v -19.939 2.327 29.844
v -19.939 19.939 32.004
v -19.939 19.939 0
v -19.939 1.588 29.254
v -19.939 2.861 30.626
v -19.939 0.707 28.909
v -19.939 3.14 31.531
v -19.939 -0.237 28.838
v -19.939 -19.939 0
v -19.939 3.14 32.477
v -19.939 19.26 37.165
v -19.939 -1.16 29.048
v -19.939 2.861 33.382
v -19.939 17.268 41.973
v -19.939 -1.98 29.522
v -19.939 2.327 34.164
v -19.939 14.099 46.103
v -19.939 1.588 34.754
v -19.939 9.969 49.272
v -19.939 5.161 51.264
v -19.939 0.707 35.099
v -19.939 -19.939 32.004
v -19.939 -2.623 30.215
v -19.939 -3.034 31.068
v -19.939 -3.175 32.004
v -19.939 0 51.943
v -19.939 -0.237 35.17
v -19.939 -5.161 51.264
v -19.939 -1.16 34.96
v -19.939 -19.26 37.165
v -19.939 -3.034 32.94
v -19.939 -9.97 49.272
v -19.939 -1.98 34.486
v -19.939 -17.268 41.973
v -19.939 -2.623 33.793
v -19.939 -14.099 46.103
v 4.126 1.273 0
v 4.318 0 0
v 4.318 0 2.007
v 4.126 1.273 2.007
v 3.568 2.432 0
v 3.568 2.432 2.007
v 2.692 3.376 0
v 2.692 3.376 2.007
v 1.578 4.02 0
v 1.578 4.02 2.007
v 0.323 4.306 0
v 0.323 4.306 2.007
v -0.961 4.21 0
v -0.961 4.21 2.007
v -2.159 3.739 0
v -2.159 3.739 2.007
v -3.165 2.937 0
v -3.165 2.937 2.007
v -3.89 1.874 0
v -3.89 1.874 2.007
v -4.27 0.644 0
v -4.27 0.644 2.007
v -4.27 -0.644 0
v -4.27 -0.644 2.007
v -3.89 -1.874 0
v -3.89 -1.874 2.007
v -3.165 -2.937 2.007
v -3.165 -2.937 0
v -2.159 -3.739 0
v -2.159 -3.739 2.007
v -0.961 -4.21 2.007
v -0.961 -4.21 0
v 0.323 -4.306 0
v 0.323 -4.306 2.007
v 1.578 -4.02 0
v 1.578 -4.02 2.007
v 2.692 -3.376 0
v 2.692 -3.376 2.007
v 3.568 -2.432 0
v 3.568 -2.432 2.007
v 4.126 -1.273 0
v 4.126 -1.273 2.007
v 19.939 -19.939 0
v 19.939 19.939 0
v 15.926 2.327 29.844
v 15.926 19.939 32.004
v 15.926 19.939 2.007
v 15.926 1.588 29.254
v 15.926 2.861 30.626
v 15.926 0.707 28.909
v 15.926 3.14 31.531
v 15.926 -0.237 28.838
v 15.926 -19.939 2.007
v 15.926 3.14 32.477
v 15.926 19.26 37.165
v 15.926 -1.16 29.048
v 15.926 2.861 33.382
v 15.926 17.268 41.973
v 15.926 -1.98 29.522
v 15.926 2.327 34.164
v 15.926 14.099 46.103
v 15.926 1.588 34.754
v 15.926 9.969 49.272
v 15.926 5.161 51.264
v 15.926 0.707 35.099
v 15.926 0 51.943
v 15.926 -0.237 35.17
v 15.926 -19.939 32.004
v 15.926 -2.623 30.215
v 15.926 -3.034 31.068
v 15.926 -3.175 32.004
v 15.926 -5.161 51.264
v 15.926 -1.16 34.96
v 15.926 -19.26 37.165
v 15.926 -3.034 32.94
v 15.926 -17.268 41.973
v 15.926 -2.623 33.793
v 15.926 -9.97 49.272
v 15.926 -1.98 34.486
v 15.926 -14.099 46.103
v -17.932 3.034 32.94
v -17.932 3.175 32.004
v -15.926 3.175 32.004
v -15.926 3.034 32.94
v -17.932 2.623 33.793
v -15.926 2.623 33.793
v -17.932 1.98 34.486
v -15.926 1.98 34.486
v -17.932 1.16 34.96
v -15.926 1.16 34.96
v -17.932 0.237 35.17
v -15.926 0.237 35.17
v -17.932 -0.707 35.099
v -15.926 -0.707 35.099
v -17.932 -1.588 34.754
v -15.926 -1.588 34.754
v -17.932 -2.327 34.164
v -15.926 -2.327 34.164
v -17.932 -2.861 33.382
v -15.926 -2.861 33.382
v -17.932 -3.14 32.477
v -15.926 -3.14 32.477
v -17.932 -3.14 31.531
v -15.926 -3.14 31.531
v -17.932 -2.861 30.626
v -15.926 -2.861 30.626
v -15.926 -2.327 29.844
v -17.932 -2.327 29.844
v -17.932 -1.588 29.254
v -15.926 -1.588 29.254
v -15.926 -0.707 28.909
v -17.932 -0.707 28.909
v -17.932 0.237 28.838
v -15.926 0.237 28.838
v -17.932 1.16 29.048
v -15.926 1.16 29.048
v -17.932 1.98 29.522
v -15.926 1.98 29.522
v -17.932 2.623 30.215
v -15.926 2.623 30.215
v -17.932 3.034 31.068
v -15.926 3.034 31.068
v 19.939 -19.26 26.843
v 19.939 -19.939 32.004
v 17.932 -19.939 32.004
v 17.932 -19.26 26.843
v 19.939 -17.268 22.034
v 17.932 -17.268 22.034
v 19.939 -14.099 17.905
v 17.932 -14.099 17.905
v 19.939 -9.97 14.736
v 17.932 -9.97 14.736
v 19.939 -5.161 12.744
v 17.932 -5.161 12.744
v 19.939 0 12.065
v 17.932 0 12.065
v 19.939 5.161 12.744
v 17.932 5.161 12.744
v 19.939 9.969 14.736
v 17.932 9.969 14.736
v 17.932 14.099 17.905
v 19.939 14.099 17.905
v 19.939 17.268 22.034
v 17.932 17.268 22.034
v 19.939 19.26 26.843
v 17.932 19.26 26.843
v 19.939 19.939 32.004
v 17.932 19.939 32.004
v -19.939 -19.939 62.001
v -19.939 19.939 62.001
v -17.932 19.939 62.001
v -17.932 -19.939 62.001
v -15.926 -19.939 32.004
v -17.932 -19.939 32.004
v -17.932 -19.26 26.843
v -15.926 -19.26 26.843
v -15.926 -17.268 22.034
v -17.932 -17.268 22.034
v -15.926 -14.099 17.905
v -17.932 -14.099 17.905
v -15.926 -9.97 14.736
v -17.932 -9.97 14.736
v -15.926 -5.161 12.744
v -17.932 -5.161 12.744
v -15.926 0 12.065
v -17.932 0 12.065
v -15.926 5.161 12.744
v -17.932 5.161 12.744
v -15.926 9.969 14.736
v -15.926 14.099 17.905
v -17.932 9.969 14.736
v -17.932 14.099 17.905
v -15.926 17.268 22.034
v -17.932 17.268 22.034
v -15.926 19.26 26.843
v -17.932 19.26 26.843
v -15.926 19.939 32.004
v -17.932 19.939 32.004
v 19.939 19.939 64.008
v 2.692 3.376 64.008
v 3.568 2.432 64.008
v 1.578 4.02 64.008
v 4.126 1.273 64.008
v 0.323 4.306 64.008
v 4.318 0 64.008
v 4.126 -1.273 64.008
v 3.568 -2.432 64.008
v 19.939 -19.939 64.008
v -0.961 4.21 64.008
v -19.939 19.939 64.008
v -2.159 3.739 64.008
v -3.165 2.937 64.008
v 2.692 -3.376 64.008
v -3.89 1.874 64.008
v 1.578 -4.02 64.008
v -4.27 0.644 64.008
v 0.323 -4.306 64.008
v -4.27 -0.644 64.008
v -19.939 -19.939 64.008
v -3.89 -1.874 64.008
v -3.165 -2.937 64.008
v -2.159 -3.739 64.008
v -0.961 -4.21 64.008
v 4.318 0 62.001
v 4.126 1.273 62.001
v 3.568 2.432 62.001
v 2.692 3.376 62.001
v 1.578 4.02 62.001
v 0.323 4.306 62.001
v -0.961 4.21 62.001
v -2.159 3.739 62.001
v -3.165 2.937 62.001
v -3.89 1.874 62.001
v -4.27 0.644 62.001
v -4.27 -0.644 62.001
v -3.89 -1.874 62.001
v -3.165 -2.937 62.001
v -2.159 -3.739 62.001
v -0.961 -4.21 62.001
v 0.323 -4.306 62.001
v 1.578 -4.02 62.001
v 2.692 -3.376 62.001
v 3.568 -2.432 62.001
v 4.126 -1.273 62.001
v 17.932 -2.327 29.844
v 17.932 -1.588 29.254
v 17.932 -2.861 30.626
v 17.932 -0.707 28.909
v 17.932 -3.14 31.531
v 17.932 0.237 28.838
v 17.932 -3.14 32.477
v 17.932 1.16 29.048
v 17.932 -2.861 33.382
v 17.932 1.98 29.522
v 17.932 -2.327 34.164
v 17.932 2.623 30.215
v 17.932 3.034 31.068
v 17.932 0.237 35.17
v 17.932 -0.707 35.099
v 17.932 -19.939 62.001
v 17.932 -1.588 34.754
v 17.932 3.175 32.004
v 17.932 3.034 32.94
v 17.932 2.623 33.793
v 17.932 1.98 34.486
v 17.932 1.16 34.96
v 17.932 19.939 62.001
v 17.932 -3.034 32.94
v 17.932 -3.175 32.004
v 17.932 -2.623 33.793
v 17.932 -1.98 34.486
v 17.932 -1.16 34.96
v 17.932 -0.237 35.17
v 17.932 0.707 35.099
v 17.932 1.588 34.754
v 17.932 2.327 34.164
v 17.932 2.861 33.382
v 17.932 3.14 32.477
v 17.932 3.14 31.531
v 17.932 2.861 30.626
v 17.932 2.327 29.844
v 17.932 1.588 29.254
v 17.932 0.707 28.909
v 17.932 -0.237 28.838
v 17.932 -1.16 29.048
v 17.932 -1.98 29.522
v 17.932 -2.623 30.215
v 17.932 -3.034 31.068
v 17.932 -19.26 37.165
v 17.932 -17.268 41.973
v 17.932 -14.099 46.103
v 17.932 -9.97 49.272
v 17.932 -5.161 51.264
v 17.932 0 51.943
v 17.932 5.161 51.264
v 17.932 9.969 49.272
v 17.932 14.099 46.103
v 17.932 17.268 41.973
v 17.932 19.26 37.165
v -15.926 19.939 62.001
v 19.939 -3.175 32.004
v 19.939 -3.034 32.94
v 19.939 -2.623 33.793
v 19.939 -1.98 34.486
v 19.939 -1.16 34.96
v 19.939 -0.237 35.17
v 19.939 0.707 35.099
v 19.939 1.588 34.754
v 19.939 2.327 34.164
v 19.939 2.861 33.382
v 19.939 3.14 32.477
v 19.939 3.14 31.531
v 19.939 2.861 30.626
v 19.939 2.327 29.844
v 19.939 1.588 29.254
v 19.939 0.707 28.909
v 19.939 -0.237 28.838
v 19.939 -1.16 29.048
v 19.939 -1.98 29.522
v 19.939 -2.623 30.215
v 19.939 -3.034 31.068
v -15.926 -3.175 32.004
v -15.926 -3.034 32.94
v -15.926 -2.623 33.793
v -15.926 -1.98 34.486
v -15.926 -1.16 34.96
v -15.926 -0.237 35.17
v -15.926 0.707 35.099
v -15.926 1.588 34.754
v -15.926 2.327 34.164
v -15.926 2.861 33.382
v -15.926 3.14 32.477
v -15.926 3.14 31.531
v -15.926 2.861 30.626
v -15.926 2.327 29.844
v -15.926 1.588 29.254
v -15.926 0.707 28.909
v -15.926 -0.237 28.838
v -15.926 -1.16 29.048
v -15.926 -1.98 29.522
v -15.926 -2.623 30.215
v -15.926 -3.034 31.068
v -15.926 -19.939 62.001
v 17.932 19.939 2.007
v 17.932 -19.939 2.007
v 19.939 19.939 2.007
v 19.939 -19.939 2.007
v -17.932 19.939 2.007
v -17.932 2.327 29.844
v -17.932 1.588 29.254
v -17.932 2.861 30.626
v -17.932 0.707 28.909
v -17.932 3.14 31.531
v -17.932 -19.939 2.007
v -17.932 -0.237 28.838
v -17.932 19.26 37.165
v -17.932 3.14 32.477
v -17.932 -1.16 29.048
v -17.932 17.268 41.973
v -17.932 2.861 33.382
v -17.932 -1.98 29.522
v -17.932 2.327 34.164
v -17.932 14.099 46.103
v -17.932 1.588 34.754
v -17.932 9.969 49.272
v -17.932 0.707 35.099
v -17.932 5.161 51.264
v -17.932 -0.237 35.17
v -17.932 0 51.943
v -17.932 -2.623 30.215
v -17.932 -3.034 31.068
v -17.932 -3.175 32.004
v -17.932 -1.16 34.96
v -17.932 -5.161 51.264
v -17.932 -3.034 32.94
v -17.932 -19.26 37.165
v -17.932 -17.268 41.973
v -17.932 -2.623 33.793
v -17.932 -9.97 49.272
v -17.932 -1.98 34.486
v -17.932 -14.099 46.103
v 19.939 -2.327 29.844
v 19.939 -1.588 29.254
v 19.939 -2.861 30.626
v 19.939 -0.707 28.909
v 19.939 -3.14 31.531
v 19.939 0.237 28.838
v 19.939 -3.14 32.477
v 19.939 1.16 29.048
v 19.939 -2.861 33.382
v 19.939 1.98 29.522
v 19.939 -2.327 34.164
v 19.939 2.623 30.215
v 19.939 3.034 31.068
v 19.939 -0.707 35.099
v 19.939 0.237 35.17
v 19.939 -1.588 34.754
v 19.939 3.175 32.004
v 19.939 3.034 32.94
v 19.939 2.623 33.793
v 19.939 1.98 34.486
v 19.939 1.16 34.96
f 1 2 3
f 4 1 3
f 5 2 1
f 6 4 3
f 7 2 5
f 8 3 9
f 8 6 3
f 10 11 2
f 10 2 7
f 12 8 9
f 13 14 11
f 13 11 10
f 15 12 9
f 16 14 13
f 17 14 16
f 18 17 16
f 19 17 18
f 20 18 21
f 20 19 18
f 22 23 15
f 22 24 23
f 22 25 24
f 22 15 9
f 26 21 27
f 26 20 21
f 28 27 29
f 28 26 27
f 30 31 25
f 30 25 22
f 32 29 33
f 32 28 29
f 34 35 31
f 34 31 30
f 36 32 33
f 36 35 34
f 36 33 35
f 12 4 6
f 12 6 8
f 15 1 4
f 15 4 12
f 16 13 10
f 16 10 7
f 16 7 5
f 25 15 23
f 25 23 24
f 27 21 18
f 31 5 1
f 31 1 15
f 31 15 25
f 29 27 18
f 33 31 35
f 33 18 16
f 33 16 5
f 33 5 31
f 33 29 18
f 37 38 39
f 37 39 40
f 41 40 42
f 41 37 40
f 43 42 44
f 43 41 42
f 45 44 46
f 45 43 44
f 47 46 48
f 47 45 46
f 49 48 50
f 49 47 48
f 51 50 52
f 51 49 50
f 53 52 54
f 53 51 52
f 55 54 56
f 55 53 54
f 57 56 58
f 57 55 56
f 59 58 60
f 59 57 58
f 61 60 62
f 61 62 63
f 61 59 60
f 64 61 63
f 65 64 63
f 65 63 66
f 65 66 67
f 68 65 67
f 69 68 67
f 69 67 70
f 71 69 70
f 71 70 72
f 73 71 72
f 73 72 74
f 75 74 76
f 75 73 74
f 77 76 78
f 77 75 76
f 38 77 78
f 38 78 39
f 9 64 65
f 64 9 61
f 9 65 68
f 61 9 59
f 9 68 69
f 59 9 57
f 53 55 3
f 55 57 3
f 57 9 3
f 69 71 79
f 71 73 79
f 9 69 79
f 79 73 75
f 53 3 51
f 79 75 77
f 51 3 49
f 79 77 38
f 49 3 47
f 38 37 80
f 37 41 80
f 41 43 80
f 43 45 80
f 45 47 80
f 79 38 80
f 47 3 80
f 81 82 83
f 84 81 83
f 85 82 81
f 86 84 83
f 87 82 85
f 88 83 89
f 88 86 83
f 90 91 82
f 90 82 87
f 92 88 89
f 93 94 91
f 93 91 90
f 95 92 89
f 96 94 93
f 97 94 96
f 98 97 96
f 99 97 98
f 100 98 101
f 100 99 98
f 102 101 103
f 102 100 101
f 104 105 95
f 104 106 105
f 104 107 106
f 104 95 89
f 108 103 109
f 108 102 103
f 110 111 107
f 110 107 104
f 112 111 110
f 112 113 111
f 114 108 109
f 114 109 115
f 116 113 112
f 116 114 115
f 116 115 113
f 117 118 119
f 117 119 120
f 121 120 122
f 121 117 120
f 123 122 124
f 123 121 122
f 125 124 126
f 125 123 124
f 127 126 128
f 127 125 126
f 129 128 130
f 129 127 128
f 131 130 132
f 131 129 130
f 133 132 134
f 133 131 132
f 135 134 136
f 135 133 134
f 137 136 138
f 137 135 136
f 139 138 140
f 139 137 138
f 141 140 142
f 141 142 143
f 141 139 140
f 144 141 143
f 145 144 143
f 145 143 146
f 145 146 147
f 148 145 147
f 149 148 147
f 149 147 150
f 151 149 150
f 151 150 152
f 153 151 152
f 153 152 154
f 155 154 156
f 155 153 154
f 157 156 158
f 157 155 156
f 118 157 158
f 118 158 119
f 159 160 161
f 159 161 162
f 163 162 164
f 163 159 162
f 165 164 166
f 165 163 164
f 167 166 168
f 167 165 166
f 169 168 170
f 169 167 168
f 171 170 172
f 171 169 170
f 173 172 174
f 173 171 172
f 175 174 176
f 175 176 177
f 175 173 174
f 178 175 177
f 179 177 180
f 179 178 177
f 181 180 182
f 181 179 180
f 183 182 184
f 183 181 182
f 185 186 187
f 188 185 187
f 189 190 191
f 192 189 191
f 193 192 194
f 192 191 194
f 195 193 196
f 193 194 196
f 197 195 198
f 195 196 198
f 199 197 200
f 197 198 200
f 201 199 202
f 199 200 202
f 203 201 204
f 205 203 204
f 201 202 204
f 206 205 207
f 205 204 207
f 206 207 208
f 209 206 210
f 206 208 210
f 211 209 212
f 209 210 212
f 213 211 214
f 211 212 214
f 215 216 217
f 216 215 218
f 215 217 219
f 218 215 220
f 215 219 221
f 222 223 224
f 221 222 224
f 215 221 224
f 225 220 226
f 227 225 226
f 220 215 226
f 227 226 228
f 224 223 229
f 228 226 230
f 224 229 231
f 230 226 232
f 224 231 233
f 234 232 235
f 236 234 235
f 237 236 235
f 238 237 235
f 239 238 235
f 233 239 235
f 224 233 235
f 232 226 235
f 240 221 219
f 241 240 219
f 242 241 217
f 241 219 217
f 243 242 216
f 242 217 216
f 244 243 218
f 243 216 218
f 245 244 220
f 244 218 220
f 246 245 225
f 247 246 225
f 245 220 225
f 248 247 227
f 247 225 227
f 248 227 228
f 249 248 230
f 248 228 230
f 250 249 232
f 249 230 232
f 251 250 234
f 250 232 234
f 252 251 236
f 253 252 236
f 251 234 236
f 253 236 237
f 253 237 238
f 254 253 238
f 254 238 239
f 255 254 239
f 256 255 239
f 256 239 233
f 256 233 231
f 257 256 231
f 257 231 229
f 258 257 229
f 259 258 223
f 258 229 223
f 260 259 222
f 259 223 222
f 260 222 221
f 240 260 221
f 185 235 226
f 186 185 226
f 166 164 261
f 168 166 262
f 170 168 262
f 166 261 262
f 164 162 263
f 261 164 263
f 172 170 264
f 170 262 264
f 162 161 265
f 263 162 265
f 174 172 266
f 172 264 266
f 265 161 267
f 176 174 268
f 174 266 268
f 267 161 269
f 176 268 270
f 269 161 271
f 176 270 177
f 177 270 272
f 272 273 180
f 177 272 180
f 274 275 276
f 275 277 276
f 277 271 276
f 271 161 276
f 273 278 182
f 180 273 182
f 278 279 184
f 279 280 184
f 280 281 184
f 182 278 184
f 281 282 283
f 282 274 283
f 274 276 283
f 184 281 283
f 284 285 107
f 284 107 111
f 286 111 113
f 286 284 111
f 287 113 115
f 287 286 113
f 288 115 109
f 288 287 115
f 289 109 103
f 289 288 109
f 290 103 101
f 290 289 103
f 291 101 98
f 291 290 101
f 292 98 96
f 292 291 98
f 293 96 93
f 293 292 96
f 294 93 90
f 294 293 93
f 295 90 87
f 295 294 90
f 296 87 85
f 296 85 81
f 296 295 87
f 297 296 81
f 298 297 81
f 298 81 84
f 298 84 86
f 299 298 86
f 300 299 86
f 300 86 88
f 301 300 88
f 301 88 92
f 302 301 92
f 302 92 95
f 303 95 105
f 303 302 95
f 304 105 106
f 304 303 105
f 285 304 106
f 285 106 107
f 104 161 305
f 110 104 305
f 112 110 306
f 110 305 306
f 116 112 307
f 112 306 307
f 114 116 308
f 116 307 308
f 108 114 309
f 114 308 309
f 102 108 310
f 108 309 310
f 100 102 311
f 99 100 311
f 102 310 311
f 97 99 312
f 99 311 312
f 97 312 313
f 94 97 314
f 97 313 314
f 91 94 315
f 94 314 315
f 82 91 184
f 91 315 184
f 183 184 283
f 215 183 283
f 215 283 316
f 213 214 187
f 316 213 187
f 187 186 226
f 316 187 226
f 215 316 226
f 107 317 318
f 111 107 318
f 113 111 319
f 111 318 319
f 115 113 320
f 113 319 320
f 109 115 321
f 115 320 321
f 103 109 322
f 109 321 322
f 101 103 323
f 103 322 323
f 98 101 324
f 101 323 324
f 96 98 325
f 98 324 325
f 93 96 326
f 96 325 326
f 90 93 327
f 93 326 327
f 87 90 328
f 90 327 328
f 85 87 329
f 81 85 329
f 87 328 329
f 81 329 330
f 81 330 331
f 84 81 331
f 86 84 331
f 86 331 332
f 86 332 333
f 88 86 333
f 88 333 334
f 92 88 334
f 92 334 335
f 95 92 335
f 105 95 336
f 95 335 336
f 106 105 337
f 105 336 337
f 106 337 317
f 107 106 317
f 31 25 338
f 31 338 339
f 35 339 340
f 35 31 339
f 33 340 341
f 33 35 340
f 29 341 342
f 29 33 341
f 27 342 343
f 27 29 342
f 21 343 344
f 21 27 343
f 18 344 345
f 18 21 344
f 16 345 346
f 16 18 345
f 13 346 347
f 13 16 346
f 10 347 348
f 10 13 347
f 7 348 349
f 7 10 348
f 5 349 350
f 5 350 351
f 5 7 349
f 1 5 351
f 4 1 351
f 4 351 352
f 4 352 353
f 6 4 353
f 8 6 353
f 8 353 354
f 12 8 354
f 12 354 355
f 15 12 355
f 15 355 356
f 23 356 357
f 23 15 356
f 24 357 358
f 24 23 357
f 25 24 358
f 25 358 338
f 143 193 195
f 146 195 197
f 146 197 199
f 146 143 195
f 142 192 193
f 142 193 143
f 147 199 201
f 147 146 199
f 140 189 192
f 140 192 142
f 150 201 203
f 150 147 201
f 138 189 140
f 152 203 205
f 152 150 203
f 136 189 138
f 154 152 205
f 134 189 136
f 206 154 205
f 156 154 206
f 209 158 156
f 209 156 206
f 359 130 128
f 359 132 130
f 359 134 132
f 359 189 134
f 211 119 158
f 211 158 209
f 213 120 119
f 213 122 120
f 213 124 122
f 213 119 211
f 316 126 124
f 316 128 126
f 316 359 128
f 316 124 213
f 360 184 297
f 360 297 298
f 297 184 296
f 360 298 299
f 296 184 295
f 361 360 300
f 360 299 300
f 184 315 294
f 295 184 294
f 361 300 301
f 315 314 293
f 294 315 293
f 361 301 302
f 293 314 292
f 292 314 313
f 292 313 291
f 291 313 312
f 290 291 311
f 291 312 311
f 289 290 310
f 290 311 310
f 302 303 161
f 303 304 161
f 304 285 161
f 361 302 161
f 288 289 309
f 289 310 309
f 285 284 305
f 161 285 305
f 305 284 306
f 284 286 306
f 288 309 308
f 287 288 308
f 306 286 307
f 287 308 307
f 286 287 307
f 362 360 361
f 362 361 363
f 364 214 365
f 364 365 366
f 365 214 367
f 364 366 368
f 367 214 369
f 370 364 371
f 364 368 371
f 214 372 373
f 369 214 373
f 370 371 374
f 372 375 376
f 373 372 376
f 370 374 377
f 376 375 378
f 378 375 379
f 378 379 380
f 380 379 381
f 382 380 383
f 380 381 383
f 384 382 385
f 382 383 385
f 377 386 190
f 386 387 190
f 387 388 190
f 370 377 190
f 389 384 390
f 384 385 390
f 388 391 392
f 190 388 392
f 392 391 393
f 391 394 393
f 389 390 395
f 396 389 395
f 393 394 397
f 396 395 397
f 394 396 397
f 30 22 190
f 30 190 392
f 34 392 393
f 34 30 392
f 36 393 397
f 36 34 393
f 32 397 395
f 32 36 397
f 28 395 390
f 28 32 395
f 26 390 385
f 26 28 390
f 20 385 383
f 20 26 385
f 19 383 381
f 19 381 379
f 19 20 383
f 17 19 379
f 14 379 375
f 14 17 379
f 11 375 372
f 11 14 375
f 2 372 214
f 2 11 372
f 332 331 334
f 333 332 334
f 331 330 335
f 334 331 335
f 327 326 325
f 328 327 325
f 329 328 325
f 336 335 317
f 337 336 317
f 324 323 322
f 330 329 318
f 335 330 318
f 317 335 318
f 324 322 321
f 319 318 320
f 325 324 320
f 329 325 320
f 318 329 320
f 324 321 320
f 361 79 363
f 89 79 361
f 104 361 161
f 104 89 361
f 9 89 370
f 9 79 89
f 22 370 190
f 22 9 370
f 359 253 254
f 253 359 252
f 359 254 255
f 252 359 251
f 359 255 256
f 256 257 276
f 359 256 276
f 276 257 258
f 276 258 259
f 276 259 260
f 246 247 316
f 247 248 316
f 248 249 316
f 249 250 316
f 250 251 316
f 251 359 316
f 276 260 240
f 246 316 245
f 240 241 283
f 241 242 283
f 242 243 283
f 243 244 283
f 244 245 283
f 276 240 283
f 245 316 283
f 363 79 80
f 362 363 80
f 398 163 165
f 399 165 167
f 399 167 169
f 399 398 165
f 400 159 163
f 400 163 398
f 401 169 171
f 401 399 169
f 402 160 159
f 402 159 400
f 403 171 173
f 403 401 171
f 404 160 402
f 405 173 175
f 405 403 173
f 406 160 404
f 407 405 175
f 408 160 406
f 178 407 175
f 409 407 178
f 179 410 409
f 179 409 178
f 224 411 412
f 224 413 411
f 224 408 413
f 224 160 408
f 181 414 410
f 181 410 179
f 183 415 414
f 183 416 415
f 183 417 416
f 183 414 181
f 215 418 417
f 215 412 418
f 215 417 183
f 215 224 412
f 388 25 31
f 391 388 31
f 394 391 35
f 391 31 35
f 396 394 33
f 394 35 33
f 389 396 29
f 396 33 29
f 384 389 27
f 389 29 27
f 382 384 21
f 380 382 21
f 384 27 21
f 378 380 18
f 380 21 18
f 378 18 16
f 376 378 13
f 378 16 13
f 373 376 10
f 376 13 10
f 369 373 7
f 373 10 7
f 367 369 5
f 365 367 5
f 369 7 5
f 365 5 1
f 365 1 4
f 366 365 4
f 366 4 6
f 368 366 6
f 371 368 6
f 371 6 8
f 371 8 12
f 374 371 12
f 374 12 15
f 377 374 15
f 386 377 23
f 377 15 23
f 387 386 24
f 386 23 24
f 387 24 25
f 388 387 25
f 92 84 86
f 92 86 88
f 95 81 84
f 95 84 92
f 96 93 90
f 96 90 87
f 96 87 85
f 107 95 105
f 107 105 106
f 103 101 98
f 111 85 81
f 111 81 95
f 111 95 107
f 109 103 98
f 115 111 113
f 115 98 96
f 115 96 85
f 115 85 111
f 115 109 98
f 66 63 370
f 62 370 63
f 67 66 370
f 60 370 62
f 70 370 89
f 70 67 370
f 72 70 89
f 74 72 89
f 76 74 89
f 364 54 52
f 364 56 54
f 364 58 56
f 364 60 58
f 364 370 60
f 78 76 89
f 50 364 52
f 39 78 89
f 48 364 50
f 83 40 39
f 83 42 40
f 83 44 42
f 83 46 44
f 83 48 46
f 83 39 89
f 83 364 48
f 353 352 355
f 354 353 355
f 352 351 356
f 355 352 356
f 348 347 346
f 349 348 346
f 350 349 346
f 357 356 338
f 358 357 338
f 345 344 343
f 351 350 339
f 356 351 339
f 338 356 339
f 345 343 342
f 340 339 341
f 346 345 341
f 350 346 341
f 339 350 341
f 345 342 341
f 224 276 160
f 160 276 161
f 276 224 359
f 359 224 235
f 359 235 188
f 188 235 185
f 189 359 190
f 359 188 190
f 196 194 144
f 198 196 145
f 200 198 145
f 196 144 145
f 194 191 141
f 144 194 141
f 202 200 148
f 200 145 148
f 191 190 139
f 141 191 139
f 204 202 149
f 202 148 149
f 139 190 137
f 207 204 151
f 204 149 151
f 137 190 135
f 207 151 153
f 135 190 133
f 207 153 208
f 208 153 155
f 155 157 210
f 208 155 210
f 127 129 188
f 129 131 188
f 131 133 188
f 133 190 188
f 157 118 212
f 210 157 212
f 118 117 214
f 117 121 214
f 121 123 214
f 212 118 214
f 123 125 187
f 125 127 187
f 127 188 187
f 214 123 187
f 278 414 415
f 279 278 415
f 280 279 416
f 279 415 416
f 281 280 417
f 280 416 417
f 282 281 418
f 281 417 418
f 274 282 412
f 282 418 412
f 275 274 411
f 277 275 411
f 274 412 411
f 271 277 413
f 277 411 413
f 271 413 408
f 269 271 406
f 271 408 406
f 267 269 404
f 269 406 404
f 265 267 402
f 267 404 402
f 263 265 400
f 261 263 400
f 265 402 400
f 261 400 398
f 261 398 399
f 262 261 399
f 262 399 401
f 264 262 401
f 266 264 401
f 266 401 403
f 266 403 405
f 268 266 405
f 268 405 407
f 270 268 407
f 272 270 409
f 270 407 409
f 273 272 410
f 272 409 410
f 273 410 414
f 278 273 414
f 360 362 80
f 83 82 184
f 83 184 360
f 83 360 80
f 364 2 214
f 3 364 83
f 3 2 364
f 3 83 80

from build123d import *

# Parameters (mm, degrees)
F0_W      = 39.878
F0_H      = 39.878
F0_R      = 4.318
F1_DEPTH  = 2.0066
F5_R      = 3.175
F6_DEPTH  = 2.0066
F7_R      = 3.175
F8_DEPTH  = 2.0066
F9_R      = 3.175
F10_DEPTH = 2.0066
F11_R     = 3.175
F12_DEPTH = 2.0066
F13_R     = 3.175
F14_DEPTH = 4.0132


with BuildPart() as f1:
    # F0 (on Top) → F1 (new body)
    with BuildSketch(Plane.XY):
        Rectangle(F0_W, F0_H)
        Circle(F0_R, mode=Mode.SUBTRACT)
    extrude(amount=F1_DEPTH)


with BuildPart() as f4_1:
    # F4: instance of F1
    add(f1.part.mirror(Plane.XY.offset(32.004)))

    # F5 (on face) → F6 (join)
    with BuildSketch(Plane.YZ.offset(19.939)):
        with BuildLine():
            Line((-19.939, 62.0014), (-19.939, 32.004))
            ThreePointArc((-19.939, 32.004), (0, 12.065), (19.939, 32.004))
            Line((19.939, 32.004), (19.939, 62.0014))
            Line((19.939, 62.0014), (-19.939, 62.0014))
        make_face()
        with Locations((0, 32.004)):
            Circle(F5_R, mode=Mode.SUBTRACT)
    extrude(amount=-F6_DEPTH)

    # F11 (on face) → F12 (join)
    with BuildSketch(Plane.YZ.offset(-17.9324)):
        with BuildLine():
            Line((19.939, 32.004), (19.939, 64.008))
            Line((19.939, 64.008), (-19.939, 64.008))
            Line((-19.939, 64.008), (-19.939, 32.004))
            ThreePointArc((-19.939, 32.004), (0, 12.065), (19.939, 32.004))
        make_face()
        with Locations((0, 32.004)):
            Circle(F11_R, mode=Mode.SUBTRACT)
    extrude(amount=F12_DEPTH)


with BuildPart() as f1_1:
    add(f1.part)

    # F7 (on face) → F8 (join)
    with BuildSketch(Plane(origin=(17.9324, 0, 0), x_dir=(0, -1, 0), z_dir=(-1, 0, 0))):
        with BuildLine():
            Line((-19.939, 32.004), (-19.939, 2.0066))
            Line((-19.939, 2.0066), (19.939, 2.0066))
            Line((19.939, 2.0066), (19.939, 32.004))
            ThreePointArc((19.939, 32.004), (0, 51.943), (-19.939, 32.004))
        make_face()
        with Locations((0, 32.004)):
            Circle(F7_R, mode=Mode.SUBTRACT)
    extrude(amount=F8_DEPTH)

    # F9 (on face) → F10 (join)
    with BuildSketch(Plane(origin=(-19.939, 0, 0), x_dir=(0, -1, 0), z_dir=(-1, 0, 0))):
        with BuildLine():
            Line((-19.939, 2.0066), (19.939, 2.0066))
            Line((19.939, 2.0066), (19.939, 32.004))
            ThreePointArc((19.939, 32.004), (0, 51.943), (-19.939, 32.004))
            Line((-19.939, 32.004), (-19.939, 2.0066))
        make_face()
        with Locations((0, 32.004)):
            Circle(F9_R, mode=Mode.SUBTRACT)
    extrude(amount=-F10_DEPTH)


with BuildPart() as f14:
    # F13 (on face) → F14 (new body, through all)
    with BuildSketch(Plane(origin=(-19.939, 0, 0), x_dir=(0, -1, 0), z_dir=(-1, 0, 0))):
        with Locations((0, 32.004)):
            Circle(F13_R)
    extrude(amount=-F14_DEPTH)


with BuildPart() as f15_1:
    # F15: instance of F14
    add(f14.part.mirror(Plane.YZ))


solid = Compound([f4_1.part, f1_1.part, f14.part, f15_1.part])
